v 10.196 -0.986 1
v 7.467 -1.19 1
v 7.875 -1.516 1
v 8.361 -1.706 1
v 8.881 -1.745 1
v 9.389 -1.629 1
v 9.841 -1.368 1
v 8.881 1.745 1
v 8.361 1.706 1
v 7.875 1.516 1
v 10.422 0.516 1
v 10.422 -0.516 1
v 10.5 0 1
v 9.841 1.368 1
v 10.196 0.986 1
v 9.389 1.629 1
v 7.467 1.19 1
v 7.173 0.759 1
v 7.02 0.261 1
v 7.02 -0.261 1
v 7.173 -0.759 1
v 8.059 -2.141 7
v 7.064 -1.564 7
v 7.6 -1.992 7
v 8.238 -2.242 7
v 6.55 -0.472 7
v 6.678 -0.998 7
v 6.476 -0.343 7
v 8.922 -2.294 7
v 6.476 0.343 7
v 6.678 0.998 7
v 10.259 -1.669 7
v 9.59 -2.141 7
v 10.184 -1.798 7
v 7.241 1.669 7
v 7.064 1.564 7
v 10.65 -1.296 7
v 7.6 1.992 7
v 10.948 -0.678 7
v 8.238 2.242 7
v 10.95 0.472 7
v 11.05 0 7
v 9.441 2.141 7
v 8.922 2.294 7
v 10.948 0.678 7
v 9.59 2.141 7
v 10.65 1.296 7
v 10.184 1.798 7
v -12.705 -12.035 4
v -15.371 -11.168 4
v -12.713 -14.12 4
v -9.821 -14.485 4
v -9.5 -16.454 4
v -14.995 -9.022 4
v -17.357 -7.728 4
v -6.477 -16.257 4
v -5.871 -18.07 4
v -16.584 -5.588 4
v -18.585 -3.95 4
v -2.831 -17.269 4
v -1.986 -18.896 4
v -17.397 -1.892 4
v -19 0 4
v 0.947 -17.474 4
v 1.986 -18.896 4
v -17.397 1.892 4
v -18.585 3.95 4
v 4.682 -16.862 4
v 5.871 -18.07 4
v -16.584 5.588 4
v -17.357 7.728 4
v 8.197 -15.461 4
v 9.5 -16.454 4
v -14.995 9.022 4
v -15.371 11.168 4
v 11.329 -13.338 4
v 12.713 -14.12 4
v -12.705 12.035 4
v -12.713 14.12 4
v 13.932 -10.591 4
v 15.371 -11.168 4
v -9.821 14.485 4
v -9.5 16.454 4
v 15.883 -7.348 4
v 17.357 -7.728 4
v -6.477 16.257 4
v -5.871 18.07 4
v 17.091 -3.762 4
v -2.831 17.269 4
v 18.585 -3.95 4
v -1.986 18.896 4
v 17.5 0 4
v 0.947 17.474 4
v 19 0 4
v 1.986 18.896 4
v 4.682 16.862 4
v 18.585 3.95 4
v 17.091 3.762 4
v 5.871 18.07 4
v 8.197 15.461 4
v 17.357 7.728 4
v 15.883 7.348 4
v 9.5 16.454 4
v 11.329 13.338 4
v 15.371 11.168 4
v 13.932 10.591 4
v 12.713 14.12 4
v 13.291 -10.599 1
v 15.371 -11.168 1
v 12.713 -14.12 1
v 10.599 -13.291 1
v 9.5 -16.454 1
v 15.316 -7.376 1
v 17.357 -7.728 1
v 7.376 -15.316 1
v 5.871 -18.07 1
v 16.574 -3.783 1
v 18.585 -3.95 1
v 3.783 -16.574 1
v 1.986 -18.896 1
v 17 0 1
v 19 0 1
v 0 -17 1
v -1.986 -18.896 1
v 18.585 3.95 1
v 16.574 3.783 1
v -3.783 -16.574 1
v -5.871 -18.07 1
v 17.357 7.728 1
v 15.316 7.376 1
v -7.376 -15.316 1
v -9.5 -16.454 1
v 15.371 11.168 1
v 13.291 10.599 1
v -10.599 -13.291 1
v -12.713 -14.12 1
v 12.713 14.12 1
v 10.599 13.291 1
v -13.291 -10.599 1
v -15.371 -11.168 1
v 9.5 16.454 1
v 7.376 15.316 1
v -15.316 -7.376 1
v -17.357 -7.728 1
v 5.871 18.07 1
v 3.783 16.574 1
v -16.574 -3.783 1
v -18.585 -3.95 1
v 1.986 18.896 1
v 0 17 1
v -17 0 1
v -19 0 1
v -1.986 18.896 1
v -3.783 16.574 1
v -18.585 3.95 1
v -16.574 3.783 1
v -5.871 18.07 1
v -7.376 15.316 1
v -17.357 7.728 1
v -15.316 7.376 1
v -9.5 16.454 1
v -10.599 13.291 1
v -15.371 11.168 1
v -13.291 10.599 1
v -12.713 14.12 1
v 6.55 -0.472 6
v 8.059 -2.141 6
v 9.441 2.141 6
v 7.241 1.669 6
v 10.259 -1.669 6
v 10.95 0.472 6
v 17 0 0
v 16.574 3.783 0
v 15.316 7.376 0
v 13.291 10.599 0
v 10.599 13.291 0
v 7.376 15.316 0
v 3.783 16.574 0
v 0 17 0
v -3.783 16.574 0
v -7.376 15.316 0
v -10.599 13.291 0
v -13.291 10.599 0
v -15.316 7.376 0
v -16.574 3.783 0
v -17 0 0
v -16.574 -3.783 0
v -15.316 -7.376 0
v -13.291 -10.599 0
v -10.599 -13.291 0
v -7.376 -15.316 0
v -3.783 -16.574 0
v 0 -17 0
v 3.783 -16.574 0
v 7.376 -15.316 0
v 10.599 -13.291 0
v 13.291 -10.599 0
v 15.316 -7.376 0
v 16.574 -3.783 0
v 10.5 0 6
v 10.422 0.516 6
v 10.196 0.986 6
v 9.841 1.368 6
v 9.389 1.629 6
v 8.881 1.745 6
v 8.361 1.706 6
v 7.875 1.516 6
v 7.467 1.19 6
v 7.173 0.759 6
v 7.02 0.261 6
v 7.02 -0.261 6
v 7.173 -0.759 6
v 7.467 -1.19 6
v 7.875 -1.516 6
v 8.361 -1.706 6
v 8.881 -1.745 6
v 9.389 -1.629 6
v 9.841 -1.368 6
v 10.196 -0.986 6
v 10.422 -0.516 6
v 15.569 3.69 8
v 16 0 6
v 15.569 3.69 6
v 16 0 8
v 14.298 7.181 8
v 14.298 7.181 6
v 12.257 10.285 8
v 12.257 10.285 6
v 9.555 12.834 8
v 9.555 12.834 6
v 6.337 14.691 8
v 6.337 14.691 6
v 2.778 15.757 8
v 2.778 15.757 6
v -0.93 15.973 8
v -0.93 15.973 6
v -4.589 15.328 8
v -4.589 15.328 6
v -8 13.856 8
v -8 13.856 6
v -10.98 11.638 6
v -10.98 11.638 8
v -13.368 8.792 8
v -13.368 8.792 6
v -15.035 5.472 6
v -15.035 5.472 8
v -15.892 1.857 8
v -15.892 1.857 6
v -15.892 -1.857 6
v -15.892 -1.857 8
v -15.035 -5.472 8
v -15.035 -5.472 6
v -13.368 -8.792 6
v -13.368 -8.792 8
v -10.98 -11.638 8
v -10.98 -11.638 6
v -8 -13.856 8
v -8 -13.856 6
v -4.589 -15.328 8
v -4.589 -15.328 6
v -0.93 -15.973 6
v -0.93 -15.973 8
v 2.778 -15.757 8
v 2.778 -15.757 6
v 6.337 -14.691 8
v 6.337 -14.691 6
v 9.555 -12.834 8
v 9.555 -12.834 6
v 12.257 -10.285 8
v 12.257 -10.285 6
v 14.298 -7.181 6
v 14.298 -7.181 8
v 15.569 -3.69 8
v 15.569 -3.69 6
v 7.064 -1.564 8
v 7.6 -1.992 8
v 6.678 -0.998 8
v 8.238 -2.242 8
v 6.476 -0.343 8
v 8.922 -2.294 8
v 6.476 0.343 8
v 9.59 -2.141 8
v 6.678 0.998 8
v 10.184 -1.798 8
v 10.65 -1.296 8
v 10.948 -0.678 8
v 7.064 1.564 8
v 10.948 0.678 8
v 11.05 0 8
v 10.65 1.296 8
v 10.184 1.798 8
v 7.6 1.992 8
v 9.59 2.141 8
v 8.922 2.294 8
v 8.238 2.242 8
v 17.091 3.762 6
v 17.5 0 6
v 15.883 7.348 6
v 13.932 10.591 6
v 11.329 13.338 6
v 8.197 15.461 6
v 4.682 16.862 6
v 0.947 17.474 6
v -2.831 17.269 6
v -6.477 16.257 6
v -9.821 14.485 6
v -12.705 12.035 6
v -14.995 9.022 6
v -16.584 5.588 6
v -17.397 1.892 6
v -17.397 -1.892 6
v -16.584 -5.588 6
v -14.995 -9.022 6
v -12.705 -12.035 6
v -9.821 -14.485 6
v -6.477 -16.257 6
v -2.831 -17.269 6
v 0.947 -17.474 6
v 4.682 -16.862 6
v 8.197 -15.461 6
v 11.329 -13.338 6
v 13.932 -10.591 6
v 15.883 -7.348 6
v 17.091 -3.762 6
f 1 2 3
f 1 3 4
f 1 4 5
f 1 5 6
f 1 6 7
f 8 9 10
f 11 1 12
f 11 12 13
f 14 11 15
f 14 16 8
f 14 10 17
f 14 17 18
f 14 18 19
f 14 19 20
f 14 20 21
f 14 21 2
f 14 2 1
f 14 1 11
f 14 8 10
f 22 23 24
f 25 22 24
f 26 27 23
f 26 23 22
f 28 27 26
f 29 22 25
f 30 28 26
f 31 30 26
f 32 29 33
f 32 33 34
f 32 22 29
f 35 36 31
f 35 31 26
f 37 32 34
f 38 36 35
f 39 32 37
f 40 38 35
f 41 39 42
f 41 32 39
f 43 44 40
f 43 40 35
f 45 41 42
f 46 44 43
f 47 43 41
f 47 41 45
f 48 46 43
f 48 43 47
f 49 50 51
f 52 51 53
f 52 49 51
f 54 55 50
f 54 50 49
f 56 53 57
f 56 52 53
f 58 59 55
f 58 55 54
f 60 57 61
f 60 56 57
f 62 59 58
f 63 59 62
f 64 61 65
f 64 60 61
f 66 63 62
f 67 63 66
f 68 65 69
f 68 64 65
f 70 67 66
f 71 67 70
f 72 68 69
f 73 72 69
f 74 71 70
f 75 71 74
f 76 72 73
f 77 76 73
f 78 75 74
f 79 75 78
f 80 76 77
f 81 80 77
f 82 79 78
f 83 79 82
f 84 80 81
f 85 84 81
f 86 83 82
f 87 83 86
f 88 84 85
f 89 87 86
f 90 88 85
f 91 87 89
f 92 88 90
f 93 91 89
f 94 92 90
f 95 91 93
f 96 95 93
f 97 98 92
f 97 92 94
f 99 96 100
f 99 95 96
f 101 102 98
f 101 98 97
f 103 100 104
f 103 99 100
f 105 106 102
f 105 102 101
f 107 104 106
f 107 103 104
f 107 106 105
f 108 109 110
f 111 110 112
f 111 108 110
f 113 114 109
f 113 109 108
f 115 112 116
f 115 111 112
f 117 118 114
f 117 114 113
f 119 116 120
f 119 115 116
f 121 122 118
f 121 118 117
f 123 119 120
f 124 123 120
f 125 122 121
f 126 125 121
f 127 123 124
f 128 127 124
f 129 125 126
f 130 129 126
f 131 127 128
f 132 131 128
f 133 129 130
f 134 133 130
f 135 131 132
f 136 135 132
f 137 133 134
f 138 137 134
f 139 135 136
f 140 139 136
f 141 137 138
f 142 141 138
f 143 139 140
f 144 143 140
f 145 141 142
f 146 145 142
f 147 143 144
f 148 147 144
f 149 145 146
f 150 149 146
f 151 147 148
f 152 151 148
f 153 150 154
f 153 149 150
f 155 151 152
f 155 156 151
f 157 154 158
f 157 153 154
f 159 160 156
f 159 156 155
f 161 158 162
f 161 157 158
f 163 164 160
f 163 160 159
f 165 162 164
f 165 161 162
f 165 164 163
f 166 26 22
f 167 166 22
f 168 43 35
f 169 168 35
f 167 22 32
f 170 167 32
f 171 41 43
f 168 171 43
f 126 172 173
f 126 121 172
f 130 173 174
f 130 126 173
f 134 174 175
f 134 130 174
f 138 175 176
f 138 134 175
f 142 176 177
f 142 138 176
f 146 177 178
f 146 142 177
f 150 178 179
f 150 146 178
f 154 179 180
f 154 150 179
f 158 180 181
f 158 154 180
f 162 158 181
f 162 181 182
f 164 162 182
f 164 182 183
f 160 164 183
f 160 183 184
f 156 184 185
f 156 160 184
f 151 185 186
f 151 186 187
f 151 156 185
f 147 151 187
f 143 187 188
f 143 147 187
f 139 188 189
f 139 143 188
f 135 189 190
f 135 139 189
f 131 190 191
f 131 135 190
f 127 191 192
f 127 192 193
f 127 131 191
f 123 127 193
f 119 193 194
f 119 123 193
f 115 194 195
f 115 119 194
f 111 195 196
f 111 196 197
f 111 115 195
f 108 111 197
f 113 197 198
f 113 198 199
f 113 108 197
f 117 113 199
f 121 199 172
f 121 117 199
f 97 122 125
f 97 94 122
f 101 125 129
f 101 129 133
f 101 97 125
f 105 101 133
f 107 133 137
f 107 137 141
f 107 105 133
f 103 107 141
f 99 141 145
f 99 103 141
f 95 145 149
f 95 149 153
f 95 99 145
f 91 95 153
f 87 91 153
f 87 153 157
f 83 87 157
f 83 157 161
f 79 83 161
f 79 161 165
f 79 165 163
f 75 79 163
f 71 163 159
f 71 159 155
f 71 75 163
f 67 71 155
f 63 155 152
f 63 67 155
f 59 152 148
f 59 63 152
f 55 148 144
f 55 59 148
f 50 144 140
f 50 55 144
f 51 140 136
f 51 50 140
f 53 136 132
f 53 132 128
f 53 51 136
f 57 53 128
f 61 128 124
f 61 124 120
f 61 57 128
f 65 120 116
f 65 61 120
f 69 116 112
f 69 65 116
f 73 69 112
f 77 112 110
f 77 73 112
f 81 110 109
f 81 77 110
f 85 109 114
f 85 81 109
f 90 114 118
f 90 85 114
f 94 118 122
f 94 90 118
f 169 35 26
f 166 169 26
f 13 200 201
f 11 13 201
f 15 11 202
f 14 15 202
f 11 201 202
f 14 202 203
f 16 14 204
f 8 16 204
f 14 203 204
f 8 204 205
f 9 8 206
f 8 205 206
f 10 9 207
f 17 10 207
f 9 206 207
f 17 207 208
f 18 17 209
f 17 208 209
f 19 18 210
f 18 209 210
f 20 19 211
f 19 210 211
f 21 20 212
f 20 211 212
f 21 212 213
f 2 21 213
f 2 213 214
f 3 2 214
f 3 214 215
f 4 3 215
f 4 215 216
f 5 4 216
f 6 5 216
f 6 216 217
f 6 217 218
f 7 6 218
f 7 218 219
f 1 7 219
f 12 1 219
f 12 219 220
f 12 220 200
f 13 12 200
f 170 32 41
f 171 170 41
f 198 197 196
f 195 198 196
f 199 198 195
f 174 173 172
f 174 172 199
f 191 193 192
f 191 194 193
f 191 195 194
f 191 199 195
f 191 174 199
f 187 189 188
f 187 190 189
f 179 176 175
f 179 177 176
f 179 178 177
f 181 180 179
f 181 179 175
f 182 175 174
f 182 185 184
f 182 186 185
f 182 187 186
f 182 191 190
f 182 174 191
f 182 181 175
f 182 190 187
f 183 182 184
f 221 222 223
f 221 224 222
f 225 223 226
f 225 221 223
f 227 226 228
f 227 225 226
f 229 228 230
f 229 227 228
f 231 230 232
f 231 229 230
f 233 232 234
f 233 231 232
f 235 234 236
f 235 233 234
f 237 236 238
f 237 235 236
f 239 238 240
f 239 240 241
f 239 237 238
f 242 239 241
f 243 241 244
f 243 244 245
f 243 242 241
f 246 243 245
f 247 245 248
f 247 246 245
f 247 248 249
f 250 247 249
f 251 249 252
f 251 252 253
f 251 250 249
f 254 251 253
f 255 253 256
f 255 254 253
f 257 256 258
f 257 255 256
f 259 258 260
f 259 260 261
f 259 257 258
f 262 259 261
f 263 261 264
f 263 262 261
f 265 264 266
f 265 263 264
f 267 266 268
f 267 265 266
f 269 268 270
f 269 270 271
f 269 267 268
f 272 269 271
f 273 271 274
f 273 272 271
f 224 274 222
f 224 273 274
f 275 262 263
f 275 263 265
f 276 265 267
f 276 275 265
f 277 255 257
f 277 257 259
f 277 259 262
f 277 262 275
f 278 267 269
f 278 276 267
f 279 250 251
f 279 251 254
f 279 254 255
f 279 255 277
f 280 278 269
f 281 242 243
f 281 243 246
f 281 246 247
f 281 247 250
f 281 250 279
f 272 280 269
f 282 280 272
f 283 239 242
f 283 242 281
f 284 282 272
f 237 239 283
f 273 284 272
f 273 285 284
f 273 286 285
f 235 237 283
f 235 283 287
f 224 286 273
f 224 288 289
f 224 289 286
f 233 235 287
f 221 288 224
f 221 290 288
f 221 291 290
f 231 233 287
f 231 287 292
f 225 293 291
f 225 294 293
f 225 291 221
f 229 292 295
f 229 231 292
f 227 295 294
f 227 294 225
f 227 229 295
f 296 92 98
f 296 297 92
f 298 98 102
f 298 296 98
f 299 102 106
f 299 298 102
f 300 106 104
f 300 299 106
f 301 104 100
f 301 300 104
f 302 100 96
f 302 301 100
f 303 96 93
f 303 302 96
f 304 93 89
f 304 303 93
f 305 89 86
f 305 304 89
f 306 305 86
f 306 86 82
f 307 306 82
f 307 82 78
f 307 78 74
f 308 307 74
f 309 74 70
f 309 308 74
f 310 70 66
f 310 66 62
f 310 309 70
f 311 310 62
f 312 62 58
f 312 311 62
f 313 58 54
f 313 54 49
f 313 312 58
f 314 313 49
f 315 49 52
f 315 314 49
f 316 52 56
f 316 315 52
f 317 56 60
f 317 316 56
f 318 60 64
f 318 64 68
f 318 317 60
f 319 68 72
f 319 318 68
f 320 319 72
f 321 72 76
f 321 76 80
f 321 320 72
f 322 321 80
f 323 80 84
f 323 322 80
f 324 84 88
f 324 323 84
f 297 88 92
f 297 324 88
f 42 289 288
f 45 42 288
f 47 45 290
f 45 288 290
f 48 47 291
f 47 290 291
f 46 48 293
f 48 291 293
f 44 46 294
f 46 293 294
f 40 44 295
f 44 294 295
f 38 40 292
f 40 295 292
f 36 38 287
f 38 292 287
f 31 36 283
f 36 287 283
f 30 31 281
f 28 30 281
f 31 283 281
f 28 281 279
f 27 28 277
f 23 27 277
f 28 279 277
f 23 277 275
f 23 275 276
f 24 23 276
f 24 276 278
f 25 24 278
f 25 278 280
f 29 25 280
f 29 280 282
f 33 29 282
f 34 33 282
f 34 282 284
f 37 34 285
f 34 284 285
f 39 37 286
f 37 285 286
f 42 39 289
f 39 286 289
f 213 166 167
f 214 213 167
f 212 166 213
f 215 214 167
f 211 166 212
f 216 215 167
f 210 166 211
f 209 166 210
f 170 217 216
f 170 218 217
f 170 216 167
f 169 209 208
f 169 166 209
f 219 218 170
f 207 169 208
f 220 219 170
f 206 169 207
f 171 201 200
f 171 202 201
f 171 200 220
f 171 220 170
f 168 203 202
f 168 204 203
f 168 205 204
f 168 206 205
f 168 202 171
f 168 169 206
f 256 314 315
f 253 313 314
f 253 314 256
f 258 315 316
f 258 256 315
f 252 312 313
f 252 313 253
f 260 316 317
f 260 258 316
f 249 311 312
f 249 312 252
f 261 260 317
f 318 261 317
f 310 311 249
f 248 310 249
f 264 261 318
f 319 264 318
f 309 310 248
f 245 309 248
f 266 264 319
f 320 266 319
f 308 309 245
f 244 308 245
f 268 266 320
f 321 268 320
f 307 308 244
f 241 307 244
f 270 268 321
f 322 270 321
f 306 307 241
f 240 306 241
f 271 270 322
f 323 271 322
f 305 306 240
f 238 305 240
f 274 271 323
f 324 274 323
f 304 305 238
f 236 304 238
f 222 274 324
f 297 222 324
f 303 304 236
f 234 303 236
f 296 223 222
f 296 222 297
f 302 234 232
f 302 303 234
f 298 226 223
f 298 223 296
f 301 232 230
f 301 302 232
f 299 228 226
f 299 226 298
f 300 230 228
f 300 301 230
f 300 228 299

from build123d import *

# Parameters (mm, degrees)
F2_R     = 1.75
F3_DEPTH = 7
F4_R     = 1.75
F5_DEPTH = 2
F6_R     = 2.3
F7_DEPTH = 1


with BuildPart() as f1:
    # F0 (on Front) → F1 (revolve)
    with BuildSketch(Plane.XZ):
        Polygon((0, 8), (0, 0), (17, 0), (17, 1), (19, 1), (19, 4), (17.5, 4), (17.5, 6), (16, 6), (16, 8), align=None)
    revolve(axis=Axis((0, 0, 4), (0, 0, 1)))

    # F2 (on face) → F3 (cut)
    with BuildSketch(Plane.XY.offset(8)):
        with Locations((8.75, 0)):
            Circle(F2_R)
    extrude(amount=-F3_DEPTH, mode=Mode.SUBTRACT)

    # F4 (on face) → F5 (cut)
    with BuildSketch(Plane.XY.offset(8)):
        with Locations((8.75, 0)):
            Circle(F4_R)
        Polygon((10.258503366, -1.66940636), (10.95, 0.4716990566), (9.441496634, 2.1411054166), (7.241496634, 1.66940636), (6.55, -0.4716990566), (8.058503366, -2.1411054166), align=None)
    extrude(amount=-F5_DEPTH, mode=Mode.SUBTRACT)

    # F6 (on face) → F7 (cut)
    with BuildSketch(Plane.XY.offset(8)):
        with Locations((8.75, 0)):
            Circle(F6_R)
    extrude(amount=-F7_DEPTH, mode=Mode.SUBTRACT)


solid = f1.part
